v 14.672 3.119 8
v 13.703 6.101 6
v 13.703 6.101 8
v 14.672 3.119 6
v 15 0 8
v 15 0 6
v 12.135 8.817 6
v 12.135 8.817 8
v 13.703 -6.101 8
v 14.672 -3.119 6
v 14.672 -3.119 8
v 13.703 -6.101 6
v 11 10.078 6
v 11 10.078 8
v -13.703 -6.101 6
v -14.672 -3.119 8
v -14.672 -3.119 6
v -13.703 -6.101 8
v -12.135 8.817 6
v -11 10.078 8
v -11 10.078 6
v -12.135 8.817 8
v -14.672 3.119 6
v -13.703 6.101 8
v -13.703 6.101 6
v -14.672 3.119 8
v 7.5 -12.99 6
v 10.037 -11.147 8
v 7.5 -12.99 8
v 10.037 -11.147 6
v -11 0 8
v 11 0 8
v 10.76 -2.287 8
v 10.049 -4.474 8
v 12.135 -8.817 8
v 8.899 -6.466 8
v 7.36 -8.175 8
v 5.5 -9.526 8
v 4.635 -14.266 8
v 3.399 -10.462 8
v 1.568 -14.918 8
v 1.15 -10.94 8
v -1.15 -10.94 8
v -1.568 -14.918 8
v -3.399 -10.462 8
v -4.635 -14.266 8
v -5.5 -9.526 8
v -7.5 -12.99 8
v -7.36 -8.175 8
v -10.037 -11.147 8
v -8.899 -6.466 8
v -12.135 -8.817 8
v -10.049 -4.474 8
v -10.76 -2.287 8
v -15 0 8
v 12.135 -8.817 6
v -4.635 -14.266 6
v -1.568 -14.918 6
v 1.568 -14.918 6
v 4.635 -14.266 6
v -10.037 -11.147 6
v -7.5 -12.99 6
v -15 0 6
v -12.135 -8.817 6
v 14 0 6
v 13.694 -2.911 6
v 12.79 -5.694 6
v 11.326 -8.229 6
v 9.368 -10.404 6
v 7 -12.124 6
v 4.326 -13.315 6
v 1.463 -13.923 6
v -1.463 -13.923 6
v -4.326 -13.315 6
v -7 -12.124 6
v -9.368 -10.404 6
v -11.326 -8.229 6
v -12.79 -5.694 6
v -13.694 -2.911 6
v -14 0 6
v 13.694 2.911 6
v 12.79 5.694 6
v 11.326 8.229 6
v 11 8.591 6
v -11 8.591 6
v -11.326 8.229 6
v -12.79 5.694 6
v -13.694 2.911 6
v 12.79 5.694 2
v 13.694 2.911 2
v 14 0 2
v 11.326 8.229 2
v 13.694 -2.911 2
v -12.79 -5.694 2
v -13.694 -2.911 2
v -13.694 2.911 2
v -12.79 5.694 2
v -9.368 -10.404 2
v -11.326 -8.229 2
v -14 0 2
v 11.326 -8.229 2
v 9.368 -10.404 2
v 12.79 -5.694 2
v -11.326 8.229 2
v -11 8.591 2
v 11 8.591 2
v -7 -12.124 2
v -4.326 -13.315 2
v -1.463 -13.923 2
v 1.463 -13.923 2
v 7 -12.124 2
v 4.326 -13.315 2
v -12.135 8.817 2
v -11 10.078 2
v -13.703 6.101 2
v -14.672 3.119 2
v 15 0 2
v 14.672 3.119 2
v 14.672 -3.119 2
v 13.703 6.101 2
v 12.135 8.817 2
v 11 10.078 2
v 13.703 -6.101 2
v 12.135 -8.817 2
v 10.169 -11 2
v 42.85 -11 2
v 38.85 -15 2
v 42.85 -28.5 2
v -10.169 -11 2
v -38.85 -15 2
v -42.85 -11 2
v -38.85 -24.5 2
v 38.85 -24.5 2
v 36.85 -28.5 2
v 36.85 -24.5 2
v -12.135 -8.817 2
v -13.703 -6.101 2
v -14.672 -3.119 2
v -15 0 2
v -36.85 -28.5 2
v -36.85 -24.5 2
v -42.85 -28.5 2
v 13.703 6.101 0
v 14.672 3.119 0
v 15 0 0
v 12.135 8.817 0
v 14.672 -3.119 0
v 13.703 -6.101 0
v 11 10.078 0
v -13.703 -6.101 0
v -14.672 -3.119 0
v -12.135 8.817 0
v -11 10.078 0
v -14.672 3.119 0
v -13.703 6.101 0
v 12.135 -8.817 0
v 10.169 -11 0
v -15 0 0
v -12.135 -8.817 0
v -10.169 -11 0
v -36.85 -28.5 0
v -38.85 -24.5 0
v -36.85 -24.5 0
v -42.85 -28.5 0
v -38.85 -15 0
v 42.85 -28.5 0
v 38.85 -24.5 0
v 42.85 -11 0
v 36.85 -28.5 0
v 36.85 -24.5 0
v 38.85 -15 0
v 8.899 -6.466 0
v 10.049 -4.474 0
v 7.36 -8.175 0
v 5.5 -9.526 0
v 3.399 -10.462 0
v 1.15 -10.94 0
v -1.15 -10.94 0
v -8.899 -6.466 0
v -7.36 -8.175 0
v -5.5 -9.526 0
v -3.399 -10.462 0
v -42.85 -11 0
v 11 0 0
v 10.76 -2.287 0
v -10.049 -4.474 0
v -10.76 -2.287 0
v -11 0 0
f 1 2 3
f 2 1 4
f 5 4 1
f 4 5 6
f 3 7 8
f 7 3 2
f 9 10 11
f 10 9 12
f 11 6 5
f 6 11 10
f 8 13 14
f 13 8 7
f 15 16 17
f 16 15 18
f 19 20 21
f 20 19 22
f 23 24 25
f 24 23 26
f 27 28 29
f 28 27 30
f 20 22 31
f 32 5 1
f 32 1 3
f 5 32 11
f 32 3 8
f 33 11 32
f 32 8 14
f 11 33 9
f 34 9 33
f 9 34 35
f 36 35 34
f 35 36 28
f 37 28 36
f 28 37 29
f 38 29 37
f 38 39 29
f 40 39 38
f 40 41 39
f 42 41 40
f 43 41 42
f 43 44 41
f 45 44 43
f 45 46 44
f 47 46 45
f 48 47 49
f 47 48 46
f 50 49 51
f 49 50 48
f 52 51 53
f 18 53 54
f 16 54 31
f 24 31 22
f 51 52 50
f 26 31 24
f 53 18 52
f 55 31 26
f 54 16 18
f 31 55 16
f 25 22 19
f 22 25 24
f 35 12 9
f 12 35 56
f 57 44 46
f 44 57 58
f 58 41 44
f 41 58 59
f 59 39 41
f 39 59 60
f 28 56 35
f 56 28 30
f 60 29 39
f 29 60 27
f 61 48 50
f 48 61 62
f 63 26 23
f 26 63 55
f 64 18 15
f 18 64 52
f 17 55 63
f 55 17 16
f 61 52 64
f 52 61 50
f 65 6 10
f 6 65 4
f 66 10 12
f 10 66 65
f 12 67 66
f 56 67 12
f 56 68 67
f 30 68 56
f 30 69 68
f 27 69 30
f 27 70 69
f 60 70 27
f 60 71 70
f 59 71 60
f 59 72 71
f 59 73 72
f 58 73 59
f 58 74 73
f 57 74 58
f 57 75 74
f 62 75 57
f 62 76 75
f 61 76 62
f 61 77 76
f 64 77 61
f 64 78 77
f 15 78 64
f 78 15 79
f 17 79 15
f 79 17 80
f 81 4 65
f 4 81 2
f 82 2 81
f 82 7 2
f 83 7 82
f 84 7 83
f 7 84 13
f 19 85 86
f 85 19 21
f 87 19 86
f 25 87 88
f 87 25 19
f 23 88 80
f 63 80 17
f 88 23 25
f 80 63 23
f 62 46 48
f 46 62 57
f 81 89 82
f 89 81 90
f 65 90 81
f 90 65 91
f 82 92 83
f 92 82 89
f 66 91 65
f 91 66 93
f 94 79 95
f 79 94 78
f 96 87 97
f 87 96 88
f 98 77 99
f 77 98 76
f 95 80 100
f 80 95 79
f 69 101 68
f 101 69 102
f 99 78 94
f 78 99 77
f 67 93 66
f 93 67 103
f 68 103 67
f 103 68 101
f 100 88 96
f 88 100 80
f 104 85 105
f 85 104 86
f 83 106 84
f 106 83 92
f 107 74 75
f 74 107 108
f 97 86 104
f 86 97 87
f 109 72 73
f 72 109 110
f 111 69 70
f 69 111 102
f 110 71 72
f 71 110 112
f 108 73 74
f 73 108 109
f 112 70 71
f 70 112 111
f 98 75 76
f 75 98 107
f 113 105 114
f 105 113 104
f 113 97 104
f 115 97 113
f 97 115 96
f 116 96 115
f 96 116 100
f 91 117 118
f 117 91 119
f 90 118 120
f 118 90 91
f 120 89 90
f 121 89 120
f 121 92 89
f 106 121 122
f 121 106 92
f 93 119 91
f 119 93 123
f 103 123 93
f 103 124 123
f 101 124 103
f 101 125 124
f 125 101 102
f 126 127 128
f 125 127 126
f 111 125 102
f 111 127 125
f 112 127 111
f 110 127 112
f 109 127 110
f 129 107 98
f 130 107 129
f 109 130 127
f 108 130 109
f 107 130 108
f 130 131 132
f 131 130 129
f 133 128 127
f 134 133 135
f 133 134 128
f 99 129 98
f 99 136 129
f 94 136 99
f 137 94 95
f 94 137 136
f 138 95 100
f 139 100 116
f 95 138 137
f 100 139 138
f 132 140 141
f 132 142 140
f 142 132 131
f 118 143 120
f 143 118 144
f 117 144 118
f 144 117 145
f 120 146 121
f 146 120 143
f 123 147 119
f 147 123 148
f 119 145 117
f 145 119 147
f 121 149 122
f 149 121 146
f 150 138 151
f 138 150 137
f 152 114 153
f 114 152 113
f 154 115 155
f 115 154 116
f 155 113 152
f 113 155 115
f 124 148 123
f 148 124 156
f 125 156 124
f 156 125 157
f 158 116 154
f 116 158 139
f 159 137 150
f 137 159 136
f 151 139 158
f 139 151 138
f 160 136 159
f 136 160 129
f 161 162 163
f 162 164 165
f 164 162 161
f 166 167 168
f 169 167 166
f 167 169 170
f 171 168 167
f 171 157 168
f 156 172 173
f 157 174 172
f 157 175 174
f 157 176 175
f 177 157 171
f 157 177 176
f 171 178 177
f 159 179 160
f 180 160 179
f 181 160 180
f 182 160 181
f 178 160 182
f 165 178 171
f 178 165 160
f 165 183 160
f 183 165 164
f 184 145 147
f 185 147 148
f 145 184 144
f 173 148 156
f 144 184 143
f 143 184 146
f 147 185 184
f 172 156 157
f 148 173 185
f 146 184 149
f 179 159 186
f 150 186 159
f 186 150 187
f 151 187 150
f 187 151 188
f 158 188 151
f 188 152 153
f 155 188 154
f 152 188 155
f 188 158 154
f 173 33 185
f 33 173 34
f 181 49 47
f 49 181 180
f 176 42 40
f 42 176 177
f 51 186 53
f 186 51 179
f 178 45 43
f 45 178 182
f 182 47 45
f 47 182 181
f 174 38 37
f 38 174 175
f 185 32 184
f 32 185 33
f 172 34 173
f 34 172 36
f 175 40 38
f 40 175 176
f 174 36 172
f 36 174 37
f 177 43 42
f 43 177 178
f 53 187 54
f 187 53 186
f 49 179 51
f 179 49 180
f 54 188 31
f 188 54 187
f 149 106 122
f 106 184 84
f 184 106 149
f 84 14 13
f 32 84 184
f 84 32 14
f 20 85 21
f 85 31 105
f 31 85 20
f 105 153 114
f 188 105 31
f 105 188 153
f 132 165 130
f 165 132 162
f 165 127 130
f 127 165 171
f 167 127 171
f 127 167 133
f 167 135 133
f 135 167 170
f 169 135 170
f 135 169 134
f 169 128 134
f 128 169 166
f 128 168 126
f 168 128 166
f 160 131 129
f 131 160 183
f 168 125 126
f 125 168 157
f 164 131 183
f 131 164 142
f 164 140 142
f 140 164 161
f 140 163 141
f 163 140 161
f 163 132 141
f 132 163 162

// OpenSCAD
phone_width = 77.7; // [20:200]
phone_thickness = 9.5; // [5:100]
arm_width = 4; // [1:20]
finger_length = 2; // [2:20]
ziptie_width = 4; // [2:20]
bike_tube_size = 11; // [5:40]

difference(){
    union() {
        translate([0, 0, ziptie_width+2]) cylinder(2, bike_tube_size+4, bike_tube_size+4);
        translate([0, 0, 2]) cylinder(ziptie_width, bike_tube_size+3, bike_tube_size+3);
        cylinder(2, bike_tube_size+4, bike_tube_size+4);
    }
    cylinder(50, bike_tube_size, bike_tube_size, true);
    translate([0, bike_tube_size, 0]) cube([bike_tube_size*2,bike_tube_size*2,50], true);
};



translate([-phone_width/2, -bike_tube_size-phone_thickness-arm_width, 0]) linear_extrude(2) difference(){
    translate([-arm_width, -arm_width, 0])
        square([phone_width+arm_width*2,phone_thickness+arm_width*2]);
    square([phone_width,phone_thickness]);
    translate([finger_length, -arm_width, 0]) square([phone_width-finger_length*2,arm_width]);
}
